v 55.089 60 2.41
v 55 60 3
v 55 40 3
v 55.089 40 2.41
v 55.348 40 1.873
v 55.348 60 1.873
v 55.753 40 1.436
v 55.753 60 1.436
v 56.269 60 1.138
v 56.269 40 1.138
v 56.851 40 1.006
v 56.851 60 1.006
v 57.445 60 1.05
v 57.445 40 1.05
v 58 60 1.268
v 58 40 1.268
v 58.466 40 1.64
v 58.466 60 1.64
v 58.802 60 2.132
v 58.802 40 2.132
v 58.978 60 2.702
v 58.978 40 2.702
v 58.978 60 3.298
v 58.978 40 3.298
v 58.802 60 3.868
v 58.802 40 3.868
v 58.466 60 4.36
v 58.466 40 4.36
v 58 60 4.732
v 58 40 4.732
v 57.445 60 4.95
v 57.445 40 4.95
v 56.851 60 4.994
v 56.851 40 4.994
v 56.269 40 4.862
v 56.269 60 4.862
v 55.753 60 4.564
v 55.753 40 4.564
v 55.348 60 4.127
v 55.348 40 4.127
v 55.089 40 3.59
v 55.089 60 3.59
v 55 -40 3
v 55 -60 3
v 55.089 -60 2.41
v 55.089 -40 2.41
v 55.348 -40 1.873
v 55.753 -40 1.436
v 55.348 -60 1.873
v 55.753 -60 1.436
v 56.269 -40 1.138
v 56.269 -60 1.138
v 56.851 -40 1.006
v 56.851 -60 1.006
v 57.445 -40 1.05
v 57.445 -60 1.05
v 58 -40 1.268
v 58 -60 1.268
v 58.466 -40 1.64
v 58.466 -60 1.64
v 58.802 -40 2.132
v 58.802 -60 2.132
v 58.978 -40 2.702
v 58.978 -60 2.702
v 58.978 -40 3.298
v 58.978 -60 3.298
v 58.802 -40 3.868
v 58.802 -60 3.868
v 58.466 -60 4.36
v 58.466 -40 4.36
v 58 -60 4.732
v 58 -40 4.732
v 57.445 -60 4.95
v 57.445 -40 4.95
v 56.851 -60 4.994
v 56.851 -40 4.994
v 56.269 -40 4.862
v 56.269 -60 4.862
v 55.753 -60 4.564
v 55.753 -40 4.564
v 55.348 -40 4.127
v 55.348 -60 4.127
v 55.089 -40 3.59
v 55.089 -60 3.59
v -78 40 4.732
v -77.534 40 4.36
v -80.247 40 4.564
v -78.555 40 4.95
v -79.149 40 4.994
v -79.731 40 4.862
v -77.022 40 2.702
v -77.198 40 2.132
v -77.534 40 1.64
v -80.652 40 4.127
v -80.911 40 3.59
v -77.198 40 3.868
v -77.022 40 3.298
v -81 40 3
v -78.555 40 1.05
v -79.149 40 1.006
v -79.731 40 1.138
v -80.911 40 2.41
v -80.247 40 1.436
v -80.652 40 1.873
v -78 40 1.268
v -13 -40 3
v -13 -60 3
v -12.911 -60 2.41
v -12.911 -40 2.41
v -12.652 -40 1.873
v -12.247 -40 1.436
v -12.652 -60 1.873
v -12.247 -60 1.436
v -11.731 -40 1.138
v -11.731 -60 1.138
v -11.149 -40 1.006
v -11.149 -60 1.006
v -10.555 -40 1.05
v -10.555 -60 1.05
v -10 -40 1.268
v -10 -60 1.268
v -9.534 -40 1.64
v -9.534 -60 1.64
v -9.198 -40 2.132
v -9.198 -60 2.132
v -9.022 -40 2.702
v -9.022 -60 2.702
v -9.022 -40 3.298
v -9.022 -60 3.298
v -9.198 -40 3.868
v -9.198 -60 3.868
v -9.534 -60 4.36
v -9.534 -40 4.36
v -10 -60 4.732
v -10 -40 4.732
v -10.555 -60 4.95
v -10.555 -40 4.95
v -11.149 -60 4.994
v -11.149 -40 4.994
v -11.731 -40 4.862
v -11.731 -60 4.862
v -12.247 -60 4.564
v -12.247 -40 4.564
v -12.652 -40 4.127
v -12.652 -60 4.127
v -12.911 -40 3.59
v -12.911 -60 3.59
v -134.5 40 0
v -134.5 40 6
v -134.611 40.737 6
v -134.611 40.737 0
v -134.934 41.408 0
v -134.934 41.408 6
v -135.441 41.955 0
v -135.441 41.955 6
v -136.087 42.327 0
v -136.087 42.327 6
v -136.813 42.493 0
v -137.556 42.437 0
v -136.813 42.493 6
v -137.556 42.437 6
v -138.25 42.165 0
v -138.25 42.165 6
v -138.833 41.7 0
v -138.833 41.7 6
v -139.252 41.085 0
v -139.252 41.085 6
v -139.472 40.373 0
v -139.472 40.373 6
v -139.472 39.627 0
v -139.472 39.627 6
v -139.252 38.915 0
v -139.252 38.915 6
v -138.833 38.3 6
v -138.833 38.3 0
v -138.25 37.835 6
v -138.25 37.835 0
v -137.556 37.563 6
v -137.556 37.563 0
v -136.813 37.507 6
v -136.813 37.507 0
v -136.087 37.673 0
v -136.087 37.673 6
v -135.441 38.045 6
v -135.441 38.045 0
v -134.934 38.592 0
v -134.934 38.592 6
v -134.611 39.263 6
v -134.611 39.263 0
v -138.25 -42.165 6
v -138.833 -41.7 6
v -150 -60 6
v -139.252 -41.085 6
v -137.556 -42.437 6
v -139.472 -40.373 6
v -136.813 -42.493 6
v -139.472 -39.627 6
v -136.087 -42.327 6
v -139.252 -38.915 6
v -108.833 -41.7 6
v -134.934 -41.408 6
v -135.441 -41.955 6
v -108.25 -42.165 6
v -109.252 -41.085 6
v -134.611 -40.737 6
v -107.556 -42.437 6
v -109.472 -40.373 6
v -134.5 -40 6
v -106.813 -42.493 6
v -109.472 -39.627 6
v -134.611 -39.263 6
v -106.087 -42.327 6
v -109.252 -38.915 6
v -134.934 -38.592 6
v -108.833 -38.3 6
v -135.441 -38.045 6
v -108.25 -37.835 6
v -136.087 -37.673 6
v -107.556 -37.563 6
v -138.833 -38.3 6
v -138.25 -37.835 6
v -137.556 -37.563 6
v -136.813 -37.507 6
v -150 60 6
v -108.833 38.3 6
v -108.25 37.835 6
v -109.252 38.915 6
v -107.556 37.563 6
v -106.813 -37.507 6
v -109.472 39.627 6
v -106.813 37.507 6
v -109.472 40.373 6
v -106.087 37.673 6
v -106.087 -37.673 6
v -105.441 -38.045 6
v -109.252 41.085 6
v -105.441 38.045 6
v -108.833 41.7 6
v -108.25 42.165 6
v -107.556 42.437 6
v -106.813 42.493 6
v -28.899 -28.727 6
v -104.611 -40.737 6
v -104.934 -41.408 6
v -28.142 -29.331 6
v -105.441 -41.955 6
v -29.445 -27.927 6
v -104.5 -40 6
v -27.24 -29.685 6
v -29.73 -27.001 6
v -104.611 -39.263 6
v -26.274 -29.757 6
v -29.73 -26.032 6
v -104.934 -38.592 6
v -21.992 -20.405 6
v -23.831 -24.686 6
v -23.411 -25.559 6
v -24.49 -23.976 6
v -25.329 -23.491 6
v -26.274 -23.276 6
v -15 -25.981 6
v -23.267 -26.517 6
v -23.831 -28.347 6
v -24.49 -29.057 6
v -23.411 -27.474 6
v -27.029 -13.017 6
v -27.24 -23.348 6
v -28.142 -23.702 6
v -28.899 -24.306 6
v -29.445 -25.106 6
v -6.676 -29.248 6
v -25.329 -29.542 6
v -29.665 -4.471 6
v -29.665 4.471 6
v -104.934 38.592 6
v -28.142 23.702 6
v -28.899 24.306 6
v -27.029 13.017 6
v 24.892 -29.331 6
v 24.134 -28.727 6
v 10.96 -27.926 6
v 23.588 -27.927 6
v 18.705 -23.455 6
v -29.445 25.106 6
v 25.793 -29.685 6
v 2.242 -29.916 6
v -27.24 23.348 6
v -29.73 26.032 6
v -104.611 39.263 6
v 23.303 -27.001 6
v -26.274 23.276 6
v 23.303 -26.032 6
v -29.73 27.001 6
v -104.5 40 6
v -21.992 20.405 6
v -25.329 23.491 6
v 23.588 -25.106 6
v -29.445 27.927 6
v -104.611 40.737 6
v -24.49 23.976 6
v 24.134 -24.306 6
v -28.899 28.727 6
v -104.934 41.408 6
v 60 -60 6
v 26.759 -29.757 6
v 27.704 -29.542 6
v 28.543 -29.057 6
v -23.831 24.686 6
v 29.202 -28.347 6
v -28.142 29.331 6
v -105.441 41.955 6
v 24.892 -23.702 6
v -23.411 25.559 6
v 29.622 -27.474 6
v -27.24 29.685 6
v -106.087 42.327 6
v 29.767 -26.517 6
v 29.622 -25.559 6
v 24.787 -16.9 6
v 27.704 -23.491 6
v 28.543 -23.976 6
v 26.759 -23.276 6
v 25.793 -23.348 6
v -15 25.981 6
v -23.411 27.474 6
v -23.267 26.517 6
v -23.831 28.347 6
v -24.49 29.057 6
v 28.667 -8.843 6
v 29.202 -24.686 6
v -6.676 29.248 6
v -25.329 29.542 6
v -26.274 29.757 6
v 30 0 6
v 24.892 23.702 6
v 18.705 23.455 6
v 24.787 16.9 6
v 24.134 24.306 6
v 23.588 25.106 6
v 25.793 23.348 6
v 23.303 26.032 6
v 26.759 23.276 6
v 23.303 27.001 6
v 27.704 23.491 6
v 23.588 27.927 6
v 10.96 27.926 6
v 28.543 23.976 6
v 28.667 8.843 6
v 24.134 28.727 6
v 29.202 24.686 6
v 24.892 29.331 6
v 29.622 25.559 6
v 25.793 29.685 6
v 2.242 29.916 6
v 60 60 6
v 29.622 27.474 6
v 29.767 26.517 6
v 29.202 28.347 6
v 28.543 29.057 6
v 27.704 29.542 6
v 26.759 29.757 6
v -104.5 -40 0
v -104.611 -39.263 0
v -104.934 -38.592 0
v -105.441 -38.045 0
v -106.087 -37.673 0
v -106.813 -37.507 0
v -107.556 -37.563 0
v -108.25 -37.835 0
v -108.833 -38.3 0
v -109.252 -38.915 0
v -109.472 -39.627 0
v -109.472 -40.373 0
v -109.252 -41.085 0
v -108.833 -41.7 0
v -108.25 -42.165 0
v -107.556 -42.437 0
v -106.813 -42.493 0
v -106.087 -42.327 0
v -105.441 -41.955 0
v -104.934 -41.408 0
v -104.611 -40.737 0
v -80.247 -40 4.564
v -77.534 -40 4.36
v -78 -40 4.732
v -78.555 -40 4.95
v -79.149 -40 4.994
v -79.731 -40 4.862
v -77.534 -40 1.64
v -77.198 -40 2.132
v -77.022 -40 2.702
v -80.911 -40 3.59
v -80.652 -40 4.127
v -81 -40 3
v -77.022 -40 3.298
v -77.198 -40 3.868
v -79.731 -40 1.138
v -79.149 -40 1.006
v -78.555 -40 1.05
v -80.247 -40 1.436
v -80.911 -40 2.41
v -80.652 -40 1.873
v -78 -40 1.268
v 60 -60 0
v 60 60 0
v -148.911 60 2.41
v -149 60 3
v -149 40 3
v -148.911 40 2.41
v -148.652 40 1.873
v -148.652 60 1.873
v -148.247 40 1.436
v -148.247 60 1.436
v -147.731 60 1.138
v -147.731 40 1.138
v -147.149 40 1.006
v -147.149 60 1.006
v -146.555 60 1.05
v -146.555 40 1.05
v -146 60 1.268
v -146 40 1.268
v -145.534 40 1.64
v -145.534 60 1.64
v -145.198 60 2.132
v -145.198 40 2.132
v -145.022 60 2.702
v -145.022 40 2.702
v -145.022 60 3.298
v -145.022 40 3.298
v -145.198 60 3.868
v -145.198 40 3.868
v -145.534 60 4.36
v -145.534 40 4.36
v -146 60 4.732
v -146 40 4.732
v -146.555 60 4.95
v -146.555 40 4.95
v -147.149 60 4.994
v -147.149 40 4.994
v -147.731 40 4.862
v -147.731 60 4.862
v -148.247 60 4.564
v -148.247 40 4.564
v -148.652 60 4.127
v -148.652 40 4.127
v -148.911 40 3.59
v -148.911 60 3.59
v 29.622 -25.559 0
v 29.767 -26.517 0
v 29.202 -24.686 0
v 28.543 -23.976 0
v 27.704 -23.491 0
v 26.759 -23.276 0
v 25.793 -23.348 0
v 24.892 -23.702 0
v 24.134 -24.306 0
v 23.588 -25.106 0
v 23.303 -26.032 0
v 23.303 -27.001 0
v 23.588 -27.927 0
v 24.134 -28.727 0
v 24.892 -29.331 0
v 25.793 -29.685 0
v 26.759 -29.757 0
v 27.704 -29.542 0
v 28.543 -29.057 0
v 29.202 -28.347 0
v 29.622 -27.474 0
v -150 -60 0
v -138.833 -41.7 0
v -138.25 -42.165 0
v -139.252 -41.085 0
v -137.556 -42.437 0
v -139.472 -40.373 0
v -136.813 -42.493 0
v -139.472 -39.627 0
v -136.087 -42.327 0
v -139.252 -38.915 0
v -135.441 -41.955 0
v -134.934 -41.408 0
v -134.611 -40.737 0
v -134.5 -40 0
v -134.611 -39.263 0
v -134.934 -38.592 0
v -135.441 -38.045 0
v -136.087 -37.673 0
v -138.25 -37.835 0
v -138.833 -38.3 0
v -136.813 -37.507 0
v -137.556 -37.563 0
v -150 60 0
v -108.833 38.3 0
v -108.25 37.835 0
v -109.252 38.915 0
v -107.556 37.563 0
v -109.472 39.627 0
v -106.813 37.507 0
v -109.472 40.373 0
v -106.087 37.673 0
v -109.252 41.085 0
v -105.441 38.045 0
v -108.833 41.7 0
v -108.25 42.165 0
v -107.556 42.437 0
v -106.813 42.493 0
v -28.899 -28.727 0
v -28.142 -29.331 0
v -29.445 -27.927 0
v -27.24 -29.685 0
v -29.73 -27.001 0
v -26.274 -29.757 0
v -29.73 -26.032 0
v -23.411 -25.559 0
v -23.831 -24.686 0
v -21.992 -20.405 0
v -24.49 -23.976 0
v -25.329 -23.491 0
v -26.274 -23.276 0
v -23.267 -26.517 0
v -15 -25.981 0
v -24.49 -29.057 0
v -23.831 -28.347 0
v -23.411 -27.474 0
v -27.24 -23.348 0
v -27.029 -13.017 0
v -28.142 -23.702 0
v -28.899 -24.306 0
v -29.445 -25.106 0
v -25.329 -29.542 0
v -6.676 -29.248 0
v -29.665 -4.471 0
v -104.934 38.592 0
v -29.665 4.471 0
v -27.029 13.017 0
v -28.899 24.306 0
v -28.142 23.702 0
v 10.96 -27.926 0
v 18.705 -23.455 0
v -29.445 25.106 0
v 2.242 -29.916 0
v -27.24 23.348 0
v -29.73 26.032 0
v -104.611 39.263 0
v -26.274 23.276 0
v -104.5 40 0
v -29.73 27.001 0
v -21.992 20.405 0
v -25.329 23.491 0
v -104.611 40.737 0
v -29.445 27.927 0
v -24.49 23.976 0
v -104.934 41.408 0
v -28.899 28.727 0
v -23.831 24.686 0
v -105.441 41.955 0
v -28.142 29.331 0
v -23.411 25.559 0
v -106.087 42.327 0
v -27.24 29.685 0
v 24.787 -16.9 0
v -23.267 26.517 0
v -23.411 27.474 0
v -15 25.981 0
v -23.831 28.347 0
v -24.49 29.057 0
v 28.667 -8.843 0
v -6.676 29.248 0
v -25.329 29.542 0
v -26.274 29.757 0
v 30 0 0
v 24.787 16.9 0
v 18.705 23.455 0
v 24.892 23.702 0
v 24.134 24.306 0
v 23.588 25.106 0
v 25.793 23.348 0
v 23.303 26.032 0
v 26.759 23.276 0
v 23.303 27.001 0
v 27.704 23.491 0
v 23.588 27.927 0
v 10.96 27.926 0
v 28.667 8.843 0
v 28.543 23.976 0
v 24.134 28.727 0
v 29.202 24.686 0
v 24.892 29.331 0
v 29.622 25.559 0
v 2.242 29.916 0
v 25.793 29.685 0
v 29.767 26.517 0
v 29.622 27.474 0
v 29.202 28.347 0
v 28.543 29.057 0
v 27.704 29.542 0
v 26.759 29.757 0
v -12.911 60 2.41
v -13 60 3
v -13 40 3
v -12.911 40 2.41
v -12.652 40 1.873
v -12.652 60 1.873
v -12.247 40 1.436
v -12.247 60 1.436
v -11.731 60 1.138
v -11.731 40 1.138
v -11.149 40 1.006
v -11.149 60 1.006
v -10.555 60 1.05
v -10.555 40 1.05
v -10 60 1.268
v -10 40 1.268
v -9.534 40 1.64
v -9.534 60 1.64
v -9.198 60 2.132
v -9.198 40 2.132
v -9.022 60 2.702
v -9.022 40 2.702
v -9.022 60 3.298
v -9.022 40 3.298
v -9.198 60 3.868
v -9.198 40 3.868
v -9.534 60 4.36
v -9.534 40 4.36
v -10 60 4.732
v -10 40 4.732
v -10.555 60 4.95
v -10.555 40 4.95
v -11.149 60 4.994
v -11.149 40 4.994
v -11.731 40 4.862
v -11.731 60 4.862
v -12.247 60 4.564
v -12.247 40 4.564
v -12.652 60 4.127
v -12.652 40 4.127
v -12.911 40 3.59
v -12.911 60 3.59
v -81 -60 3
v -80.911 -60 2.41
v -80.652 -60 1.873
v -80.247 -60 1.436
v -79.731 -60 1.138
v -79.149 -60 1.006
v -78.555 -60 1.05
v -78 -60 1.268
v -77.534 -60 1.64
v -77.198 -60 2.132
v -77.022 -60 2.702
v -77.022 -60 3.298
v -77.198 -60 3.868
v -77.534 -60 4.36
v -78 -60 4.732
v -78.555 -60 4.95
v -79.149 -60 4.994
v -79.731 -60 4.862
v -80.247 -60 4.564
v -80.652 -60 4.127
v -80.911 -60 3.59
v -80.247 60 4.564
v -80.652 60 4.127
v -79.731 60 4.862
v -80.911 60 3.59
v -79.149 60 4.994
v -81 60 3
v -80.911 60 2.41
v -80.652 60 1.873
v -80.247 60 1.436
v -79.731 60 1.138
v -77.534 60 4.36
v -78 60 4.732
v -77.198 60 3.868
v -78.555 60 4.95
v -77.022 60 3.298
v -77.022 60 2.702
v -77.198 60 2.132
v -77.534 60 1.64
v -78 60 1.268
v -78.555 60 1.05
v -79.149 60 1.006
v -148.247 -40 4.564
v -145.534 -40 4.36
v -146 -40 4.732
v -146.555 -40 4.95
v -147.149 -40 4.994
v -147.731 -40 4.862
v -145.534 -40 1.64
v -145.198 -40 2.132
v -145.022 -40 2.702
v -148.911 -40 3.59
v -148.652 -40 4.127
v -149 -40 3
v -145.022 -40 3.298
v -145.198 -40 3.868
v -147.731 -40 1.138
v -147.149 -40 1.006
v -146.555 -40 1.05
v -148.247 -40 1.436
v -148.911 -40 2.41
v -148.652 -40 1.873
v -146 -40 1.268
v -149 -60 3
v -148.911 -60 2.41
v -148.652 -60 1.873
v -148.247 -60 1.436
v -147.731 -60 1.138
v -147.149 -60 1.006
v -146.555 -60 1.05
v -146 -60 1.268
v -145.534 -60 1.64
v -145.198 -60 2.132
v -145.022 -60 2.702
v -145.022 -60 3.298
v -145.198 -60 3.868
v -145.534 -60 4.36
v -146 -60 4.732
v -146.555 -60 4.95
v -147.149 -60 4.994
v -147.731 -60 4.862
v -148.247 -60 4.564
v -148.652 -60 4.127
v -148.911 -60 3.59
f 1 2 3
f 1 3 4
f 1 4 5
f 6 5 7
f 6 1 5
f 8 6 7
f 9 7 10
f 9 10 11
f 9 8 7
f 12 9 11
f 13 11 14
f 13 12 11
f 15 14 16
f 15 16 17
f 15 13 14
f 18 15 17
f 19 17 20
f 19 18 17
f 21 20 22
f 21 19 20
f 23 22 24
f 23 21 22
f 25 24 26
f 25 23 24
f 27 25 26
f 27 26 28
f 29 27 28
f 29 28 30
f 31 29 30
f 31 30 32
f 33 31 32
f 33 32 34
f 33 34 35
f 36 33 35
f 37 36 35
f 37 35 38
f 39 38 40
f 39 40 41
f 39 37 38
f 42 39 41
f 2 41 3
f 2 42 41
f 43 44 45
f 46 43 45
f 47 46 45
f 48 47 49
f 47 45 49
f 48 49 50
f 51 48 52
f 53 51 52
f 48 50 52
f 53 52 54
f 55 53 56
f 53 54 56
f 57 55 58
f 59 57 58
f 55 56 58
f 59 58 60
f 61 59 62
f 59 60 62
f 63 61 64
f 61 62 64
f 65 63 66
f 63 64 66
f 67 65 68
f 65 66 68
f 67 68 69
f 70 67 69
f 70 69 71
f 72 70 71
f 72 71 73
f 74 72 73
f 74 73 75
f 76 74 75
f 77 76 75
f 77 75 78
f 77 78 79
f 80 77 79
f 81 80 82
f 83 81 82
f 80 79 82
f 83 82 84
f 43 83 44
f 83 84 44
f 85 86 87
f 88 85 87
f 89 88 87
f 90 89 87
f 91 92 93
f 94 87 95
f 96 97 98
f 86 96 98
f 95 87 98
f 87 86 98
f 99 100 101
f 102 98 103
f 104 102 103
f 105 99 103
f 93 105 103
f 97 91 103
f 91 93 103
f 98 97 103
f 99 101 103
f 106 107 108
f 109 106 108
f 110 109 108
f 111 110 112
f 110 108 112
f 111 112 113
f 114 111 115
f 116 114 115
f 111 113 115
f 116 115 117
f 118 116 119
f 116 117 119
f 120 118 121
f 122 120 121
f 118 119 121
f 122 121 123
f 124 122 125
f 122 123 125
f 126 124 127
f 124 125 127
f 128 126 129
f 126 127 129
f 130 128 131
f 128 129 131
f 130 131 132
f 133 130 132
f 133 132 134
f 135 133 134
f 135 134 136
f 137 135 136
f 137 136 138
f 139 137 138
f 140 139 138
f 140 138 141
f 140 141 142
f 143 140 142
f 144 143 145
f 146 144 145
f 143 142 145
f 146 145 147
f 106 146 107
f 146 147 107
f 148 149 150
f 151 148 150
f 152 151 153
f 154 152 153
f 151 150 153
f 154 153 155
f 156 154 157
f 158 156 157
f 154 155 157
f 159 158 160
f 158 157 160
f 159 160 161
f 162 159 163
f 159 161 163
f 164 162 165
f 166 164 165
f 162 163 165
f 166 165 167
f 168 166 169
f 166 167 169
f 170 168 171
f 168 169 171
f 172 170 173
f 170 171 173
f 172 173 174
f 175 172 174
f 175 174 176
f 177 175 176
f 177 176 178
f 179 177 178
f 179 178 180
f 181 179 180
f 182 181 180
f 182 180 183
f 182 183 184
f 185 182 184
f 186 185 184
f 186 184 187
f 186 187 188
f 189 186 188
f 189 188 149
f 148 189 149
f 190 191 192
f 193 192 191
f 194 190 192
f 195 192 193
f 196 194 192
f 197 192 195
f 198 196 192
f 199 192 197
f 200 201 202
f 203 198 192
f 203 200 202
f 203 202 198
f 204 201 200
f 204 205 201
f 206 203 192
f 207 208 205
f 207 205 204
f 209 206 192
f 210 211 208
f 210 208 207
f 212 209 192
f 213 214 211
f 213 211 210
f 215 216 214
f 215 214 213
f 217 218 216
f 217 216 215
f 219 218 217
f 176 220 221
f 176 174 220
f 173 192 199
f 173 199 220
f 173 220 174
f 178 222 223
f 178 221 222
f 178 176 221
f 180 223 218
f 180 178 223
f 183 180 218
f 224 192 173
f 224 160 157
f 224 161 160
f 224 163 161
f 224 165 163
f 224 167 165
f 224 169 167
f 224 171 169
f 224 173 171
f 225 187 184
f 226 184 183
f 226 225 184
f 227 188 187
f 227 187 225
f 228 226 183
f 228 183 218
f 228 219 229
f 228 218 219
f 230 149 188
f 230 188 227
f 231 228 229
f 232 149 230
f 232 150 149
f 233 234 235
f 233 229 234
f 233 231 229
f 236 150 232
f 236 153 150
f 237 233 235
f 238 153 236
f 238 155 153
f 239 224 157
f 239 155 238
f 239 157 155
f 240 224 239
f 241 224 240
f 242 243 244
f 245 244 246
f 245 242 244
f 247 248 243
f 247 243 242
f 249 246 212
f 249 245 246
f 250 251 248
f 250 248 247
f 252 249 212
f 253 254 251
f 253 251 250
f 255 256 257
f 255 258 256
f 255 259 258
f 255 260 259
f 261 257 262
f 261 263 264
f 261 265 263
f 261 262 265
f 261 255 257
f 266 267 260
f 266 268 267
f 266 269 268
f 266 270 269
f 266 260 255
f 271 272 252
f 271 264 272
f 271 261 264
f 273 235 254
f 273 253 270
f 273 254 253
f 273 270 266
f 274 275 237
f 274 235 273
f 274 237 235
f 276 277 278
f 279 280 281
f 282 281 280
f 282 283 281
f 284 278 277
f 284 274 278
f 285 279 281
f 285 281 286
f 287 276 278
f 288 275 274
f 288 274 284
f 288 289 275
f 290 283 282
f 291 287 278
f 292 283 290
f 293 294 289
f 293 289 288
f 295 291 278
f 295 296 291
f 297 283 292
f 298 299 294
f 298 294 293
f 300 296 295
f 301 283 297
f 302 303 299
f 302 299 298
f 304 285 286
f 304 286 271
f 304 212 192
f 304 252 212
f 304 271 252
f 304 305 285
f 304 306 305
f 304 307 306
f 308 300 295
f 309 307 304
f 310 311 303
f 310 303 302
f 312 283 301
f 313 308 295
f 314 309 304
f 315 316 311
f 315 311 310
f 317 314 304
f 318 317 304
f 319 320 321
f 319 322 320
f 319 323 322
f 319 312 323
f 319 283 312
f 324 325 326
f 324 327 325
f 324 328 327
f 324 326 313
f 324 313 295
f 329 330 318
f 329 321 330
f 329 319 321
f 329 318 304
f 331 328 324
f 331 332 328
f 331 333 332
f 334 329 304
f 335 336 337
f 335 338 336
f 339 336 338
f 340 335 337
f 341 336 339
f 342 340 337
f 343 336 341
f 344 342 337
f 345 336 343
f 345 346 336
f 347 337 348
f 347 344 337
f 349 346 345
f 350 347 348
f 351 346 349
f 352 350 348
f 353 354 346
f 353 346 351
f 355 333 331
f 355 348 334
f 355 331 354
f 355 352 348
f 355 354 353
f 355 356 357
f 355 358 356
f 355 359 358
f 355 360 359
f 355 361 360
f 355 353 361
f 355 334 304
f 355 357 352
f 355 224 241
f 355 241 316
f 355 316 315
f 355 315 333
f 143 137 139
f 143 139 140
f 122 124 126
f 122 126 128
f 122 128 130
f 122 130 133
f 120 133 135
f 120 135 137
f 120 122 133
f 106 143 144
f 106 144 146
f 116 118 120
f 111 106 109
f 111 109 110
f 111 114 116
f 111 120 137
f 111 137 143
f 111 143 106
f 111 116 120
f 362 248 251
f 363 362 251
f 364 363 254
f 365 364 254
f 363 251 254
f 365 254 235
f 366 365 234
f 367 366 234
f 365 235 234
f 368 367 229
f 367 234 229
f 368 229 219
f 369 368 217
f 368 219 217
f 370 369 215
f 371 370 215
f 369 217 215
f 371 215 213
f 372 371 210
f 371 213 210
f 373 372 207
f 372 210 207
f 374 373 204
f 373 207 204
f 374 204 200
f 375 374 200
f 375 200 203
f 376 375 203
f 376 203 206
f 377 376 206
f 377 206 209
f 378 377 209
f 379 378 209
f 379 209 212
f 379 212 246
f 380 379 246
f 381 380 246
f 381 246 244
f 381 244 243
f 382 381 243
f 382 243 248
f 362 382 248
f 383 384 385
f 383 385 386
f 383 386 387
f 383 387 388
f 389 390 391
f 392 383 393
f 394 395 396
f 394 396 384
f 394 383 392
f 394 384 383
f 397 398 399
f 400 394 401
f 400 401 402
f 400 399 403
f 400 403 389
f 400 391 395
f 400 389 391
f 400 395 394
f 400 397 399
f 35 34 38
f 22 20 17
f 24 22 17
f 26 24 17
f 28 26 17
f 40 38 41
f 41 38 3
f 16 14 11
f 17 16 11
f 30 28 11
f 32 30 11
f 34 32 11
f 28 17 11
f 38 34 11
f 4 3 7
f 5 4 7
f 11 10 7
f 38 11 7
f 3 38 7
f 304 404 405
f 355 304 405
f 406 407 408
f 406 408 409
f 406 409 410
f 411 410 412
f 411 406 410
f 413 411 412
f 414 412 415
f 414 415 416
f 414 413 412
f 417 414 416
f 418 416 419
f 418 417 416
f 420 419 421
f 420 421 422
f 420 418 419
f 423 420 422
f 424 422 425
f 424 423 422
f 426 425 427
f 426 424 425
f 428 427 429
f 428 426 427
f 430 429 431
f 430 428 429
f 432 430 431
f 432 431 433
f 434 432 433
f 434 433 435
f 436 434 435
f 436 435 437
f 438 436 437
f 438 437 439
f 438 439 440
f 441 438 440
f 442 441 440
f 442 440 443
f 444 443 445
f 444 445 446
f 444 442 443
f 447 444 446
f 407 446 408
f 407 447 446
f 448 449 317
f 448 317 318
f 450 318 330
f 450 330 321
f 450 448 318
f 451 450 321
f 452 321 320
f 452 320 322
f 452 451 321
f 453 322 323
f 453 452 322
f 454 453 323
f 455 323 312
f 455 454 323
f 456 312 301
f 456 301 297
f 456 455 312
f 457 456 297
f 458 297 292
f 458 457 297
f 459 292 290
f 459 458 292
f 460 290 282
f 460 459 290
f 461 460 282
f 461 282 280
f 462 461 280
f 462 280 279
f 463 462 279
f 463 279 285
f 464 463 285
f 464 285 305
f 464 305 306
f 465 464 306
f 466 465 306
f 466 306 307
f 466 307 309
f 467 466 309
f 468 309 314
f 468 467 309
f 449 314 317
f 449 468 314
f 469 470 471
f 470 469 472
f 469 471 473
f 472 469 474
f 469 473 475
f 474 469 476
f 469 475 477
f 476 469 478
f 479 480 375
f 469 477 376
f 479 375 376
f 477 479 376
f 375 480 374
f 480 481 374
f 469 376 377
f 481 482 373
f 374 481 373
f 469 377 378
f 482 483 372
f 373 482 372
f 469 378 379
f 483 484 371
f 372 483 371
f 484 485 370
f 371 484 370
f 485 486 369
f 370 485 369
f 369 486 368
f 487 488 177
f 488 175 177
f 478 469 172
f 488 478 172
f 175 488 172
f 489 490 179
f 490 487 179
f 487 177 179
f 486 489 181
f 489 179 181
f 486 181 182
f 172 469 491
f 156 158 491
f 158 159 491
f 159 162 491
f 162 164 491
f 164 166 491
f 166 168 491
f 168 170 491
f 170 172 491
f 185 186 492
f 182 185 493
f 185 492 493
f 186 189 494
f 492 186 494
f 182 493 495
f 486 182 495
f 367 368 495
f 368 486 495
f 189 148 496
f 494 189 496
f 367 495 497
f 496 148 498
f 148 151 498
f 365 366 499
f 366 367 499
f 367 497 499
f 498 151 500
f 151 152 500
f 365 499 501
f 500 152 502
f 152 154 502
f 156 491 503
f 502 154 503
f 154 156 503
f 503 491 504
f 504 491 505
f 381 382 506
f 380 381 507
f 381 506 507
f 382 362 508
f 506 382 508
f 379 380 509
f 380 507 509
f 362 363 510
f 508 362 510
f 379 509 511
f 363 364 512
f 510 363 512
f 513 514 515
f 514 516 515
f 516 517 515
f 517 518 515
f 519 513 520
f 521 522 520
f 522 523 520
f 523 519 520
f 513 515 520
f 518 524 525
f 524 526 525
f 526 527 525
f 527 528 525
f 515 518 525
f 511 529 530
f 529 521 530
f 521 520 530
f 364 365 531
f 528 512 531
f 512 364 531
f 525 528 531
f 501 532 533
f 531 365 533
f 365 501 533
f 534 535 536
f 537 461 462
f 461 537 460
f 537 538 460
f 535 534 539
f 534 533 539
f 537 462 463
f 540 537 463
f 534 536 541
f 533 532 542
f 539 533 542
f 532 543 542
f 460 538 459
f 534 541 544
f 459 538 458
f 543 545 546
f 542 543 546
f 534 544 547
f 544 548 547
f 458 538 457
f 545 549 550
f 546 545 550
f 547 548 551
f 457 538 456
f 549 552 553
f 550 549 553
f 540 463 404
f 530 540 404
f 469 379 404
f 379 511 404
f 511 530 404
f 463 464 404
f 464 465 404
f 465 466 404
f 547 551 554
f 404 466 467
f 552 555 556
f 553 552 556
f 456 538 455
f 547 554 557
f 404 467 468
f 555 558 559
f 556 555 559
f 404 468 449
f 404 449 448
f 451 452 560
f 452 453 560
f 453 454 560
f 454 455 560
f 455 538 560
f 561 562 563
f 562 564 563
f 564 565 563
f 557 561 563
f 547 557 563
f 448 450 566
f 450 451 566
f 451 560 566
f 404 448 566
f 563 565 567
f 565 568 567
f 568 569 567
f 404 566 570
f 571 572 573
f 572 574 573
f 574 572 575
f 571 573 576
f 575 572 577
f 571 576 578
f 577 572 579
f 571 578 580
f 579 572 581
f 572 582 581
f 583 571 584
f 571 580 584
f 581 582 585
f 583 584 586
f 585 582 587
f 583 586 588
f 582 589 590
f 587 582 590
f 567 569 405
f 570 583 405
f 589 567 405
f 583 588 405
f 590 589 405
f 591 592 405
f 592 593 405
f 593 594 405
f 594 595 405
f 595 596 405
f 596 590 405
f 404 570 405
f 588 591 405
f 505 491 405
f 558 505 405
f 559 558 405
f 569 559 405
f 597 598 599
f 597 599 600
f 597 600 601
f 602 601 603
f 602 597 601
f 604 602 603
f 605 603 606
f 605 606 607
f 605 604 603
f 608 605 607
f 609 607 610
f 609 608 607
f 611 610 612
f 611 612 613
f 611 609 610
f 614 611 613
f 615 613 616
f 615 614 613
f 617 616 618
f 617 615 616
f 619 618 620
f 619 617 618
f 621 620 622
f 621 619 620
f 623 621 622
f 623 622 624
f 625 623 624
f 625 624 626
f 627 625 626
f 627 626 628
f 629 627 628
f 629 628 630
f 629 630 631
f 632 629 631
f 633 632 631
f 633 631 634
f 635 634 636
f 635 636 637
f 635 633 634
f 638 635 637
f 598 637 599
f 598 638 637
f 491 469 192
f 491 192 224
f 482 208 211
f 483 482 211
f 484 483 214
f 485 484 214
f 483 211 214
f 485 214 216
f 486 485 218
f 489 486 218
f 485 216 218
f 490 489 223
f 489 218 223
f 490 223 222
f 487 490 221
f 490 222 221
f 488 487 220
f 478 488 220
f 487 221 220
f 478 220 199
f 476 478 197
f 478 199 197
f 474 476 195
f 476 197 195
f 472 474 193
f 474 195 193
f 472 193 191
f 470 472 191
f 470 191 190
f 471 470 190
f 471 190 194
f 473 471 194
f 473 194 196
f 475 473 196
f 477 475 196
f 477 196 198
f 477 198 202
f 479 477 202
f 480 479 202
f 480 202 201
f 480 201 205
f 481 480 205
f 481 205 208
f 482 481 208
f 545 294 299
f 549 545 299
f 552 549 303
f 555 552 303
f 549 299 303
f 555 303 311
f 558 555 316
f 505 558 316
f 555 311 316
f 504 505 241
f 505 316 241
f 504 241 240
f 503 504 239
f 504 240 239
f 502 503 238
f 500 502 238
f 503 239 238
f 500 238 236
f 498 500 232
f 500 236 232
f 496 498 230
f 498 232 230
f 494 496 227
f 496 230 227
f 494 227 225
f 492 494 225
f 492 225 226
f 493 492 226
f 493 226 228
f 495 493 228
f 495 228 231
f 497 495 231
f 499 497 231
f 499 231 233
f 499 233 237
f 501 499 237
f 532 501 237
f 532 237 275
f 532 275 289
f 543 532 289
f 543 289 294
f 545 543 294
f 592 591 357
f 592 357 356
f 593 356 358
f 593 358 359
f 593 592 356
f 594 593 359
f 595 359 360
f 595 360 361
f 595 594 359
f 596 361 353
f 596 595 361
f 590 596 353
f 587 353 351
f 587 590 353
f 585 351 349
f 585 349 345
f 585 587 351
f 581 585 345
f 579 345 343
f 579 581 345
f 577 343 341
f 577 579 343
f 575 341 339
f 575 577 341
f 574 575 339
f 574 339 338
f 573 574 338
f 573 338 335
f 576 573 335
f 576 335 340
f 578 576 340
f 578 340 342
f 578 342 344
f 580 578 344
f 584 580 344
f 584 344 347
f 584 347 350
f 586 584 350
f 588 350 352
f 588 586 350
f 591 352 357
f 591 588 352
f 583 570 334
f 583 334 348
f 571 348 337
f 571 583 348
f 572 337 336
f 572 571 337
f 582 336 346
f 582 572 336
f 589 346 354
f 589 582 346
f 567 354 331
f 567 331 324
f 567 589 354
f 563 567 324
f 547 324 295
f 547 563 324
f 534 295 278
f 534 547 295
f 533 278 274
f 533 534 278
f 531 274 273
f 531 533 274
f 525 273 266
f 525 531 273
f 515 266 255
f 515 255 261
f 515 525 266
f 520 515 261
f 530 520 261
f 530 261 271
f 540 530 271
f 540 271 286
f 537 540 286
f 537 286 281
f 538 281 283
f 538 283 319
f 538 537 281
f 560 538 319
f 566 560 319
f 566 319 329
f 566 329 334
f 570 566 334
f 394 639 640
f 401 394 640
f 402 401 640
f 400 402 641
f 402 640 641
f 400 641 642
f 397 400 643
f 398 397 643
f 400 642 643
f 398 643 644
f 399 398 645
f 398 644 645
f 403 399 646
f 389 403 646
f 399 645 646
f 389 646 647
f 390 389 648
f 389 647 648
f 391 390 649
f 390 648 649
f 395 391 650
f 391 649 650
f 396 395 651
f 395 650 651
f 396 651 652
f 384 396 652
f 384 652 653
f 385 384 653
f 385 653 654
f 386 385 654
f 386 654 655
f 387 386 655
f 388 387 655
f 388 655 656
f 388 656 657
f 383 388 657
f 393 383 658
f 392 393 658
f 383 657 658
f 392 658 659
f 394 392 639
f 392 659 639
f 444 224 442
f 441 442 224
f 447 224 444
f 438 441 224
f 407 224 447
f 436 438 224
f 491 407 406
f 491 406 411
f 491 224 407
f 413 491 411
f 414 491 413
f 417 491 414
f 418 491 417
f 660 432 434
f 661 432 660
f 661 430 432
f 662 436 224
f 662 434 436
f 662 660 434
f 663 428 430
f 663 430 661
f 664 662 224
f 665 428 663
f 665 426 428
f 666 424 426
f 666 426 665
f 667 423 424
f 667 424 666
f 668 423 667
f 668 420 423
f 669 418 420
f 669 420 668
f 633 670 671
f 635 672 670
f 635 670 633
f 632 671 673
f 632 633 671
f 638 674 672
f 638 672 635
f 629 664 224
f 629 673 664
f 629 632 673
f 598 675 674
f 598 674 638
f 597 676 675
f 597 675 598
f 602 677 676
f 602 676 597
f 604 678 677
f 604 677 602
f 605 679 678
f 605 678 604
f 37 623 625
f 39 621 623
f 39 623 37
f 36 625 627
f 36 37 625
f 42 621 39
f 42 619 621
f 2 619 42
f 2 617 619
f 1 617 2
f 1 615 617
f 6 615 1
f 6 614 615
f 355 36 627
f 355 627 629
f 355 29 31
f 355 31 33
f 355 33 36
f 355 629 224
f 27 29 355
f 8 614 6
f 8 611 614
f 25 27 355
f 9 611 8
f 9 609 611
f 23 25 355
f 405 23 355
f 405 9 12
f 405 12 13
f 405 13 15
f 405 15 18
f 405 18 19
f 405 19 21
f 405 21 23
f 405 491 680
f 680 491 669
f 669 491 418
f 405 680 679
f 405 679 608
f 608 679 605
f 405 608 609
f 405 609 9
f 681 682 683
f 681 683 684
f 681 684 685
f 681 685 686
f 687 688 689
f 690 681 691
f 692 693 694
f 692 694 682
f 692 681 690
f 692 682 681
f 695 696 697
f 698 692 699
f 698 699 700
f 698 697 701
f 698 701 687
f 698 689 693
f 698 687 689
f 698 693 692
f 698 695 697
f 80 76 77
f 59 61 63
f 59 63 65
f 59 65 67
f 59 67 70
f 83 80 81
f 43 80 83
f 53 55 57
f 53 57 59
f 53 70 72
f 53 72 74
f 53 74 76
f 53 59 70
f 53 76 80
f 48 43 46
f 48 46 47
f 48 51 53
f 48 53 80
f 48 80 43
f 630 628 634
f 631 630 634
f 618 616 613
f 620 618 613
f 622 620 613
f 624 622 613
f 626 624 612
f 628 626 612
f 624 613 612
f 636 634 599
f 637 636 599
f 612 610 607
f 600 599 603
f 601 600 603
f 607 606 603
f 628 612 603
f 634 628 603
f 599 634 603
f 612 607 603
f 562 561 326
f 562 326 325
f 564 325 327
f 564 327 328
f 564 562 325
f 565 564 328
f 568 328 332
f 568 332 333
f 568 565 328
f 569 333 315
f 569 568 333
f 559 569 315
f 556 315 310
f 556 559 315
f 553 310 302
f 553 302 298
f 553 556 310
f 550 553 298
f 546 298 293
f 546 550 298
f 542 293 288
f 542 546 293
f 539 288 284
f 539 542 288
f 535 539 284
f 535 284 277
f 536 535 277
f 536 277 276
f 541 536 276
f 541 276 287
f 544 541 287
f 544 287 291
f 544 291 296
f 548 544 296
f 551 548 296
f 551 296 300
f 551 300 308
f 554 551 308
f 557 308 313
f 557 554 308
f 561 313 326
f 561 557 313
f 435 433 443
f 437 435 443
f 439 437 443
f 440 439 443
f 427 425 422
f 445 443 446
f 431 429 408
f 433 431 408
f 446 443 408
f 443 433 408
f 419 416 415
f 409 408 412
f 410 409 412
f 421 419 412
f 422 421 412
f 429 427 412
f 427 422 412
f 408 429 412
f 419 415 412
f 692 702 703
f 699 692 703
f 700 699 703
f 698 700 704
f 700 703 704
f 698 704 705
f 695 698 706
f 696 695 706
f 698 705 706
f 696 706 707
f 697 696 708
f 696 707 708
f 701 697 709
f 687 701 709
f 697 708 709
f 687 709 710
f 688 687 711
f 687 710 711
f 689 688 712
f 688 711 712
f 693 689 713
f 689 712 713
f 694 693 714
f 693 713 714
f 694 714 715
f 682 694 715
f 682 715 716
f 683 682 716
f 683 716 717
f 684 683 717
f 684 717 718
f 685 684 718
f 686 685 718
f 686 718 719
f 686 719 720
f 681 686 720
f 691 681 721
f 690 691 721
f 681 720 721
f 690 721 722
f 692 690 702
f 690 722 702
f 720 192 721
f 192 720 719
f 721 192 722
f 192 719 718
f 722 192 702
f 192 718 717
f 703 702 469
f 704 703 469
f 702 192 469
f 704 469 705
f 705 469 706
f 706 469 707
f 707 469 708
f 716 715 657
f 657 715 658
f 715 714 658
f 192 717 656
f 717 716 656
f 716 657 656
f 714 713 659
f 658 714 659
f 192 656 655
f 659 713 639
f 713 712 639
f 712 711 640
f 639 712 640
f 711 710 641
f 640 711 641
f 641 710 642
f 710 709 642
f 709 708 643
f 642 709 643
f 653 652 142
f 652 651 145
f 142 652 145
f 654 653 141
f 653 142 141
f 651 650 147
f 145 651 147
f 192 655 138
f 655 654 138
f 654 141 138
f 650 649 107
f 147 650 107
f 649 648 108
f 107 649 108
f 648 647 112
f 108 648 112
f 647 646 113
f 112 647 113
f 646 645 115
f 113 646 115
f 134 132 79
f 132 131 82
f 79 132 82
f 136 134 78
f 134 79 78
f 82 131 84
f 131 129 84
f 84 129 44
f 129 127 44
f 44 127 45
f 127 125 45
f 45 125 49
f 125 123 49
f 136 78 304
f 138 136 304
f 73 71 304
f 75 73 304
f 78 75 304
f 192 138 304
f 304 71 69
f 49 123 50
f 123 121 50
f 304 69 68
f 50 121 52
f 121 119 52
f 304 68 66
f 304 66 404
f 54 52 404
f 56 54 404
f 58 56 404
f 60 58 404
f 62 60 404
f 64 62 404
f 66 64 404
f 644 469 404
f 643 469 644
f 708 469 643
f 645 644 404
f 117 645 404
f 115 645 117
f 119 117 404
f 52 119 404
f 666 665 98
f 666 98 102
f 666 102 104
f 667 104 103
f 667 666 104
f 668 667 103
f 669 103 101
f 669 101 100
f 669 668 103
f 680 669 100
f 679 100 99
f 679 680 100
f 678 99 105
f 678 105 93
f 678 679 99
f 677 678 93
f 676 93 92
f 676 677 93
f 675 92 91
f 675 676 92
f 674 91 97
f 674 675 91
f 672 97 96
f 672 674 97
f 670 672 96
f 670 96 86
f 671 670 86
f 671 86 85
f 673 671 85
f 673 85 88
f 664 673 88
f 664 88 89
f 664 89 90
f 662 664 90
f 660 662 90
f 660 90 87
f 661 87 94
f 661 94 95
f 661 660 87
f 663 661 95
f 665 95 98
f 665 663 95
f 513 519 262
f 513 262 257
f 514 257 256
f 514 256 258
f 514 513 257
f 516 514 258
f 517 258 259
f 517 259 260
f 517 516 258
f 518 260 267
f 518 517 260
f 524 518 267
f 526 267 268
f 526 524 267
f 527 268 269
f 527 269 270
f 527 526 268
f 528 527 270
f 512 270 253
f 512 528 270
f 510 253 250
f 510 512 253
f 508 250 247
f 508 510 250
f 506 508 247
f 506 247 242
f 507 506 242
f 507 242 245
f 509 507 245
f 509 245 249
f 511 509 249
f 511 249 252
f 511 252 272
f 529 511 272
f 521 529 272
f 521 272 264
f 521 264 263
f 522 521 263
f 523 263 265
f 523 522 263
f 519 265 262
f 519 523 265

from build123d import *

# Parameters (mm, degrees)
SKETCH_1_W          = 210
SKETCH_1_H          = 120
SKETCH_1_R          = 3.25
SKETCH_1_R_2        = 30
EXTRUDE_1_DEPTH     = 6
SKETCH_2_R          = 2.5
CUT_EXTRUDE_1_DEPTH = 10
SKETCH_3_R          = 2
CUT_EXTRUDE_2_DEPTH = 20


with BuildPart() as part:
    # 草图1 → 凸台-拉伸1 (new body)
    with BuildSketch(Plane.XY):
        with Locations((-45, 0)):
            Rectangle(SKETCH_1_W, SKETCH_1_H)
        with Locations((26.516504294, 26.516504294)):
            Circle(SKETCH_1_R, mode=Mode.SUBTRACT)
        with Locations((26.516504294, -26.516504294)):
            Circle(SKETCH_1_R, mode=Mode.SUBTRACT)
        with Locations((-26.516504294, -26.516504294)):
            Circle(SKETCH_1_R, mode=Mode.SUBTRACT)
        with Locations((-26.516504294, 26.516504294)):
            Circle(SKETCH_1_R, mode=Mode.SUBTRACT)
        Circle(SKETCH_1_R_2, mode=Mode.SUBTRACT)
    extrude(amount=EXTRUDE_1_DEPTH)

    # 草图2 → 切除-拉伸1 (cut)
    with BuildSketch(Plane.XY.offset(6)):
        with Locations((-137, 40)):
            Circle(SKETCH_2_R)
        with Locations((-107, 40)):
            Circle(SKETCH_2_R)
        with Locations((-107, -40)):
            Circle(SKETCH_2_R)
        with Locations((-137, -40)):
            Circle(SKETCH_2_R)
    extrude(amount=-CUT_EXTRUDE_1_DEPTH, mode=Mode.SUBTRACT)

    # 草图3 → 切除-拉伸2 (cut)
    with BuildSketch(Plane(origin=(0, -60, 0), x_dir=(-1, 0, 0), z_dir=(0, -1, 0))):
        with Locations((-57, -3)):
            Circle(SKETCH_3_R)
        with Locations((11, -3)):
            Circle(SKETCH_3_R)
        with Locations((79, -3)):
            Circle(SKETCH_3_R)
        with Locations((147, -3)):
            Circle(SKETCH_3_R)
    cut_extrude_2 = extrude(amount=-CUT_EXTRUDE_2_DEPTH, mode=Mode.SUBTRACT)

    # 镜向3: 切除-拉伸2 across plane
    add(cut_extrude_2.mirror(Plane(origin=(0, 0, 0), x_dir=(0, 0, 1), z_dir=(0, -1, 0))), mode=Mode.SUBTRACT)


solid = part.part
